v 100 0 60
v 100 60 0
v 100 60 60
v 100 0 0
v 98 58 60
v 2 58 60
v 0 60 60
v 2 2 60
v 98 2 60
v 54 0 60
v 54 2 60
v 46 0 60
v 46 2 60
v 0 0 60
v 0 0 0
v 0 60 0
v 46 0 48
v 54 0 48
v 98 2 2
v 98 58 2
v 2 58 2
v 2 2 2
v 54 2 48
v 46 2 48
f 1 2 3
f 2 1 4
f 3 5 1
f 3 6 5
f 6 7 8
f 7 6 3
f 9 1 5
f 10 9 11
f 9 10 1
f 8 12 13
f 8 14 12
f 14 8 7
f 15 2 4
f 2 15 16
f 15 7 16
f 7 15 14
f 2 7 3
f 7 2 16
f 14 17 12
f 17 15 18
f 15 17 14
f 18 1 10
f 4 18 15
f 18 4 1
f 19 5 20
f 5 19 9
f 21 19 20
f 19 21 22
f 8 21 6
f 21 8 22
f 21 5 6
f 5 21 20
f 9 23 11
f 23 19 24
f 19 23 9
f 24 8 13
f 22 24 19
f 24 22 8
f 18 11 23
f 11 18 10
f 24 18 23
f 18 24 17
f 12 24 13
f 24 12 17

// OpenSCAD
$fn = 32;

// ----------------------------------------------------------------------
// Enclosure box: notch enclosure
// ----------------------------------------------------------------------

// --- parameters (mm) ---
box_l = 100;              // outer length, X
box_w = 60;               // outer width, Y
box_h = 60;               // outer height
wall_t = 2;               // wall thickness
notch_w = 8;              // cable notch width
notch_h = 12;             // cable notch height

inner_h = box_h - wall_t;  // cavity depth
boss_h = inner_h - 2;  // corner boss height

difference() {
  cube([box_l, box_w, box_h]);
  translate([wall_t, wall_t, wall_t])
    cube([box_l - 2 * wall_t, box_w - 2 * wall_t, box_h]);
  translate([box_l / 2 - notch_w / 2, -1, box_h - notch_h])
    cube([notch_w, wall_t + 2, notch_h + 1]);
}
